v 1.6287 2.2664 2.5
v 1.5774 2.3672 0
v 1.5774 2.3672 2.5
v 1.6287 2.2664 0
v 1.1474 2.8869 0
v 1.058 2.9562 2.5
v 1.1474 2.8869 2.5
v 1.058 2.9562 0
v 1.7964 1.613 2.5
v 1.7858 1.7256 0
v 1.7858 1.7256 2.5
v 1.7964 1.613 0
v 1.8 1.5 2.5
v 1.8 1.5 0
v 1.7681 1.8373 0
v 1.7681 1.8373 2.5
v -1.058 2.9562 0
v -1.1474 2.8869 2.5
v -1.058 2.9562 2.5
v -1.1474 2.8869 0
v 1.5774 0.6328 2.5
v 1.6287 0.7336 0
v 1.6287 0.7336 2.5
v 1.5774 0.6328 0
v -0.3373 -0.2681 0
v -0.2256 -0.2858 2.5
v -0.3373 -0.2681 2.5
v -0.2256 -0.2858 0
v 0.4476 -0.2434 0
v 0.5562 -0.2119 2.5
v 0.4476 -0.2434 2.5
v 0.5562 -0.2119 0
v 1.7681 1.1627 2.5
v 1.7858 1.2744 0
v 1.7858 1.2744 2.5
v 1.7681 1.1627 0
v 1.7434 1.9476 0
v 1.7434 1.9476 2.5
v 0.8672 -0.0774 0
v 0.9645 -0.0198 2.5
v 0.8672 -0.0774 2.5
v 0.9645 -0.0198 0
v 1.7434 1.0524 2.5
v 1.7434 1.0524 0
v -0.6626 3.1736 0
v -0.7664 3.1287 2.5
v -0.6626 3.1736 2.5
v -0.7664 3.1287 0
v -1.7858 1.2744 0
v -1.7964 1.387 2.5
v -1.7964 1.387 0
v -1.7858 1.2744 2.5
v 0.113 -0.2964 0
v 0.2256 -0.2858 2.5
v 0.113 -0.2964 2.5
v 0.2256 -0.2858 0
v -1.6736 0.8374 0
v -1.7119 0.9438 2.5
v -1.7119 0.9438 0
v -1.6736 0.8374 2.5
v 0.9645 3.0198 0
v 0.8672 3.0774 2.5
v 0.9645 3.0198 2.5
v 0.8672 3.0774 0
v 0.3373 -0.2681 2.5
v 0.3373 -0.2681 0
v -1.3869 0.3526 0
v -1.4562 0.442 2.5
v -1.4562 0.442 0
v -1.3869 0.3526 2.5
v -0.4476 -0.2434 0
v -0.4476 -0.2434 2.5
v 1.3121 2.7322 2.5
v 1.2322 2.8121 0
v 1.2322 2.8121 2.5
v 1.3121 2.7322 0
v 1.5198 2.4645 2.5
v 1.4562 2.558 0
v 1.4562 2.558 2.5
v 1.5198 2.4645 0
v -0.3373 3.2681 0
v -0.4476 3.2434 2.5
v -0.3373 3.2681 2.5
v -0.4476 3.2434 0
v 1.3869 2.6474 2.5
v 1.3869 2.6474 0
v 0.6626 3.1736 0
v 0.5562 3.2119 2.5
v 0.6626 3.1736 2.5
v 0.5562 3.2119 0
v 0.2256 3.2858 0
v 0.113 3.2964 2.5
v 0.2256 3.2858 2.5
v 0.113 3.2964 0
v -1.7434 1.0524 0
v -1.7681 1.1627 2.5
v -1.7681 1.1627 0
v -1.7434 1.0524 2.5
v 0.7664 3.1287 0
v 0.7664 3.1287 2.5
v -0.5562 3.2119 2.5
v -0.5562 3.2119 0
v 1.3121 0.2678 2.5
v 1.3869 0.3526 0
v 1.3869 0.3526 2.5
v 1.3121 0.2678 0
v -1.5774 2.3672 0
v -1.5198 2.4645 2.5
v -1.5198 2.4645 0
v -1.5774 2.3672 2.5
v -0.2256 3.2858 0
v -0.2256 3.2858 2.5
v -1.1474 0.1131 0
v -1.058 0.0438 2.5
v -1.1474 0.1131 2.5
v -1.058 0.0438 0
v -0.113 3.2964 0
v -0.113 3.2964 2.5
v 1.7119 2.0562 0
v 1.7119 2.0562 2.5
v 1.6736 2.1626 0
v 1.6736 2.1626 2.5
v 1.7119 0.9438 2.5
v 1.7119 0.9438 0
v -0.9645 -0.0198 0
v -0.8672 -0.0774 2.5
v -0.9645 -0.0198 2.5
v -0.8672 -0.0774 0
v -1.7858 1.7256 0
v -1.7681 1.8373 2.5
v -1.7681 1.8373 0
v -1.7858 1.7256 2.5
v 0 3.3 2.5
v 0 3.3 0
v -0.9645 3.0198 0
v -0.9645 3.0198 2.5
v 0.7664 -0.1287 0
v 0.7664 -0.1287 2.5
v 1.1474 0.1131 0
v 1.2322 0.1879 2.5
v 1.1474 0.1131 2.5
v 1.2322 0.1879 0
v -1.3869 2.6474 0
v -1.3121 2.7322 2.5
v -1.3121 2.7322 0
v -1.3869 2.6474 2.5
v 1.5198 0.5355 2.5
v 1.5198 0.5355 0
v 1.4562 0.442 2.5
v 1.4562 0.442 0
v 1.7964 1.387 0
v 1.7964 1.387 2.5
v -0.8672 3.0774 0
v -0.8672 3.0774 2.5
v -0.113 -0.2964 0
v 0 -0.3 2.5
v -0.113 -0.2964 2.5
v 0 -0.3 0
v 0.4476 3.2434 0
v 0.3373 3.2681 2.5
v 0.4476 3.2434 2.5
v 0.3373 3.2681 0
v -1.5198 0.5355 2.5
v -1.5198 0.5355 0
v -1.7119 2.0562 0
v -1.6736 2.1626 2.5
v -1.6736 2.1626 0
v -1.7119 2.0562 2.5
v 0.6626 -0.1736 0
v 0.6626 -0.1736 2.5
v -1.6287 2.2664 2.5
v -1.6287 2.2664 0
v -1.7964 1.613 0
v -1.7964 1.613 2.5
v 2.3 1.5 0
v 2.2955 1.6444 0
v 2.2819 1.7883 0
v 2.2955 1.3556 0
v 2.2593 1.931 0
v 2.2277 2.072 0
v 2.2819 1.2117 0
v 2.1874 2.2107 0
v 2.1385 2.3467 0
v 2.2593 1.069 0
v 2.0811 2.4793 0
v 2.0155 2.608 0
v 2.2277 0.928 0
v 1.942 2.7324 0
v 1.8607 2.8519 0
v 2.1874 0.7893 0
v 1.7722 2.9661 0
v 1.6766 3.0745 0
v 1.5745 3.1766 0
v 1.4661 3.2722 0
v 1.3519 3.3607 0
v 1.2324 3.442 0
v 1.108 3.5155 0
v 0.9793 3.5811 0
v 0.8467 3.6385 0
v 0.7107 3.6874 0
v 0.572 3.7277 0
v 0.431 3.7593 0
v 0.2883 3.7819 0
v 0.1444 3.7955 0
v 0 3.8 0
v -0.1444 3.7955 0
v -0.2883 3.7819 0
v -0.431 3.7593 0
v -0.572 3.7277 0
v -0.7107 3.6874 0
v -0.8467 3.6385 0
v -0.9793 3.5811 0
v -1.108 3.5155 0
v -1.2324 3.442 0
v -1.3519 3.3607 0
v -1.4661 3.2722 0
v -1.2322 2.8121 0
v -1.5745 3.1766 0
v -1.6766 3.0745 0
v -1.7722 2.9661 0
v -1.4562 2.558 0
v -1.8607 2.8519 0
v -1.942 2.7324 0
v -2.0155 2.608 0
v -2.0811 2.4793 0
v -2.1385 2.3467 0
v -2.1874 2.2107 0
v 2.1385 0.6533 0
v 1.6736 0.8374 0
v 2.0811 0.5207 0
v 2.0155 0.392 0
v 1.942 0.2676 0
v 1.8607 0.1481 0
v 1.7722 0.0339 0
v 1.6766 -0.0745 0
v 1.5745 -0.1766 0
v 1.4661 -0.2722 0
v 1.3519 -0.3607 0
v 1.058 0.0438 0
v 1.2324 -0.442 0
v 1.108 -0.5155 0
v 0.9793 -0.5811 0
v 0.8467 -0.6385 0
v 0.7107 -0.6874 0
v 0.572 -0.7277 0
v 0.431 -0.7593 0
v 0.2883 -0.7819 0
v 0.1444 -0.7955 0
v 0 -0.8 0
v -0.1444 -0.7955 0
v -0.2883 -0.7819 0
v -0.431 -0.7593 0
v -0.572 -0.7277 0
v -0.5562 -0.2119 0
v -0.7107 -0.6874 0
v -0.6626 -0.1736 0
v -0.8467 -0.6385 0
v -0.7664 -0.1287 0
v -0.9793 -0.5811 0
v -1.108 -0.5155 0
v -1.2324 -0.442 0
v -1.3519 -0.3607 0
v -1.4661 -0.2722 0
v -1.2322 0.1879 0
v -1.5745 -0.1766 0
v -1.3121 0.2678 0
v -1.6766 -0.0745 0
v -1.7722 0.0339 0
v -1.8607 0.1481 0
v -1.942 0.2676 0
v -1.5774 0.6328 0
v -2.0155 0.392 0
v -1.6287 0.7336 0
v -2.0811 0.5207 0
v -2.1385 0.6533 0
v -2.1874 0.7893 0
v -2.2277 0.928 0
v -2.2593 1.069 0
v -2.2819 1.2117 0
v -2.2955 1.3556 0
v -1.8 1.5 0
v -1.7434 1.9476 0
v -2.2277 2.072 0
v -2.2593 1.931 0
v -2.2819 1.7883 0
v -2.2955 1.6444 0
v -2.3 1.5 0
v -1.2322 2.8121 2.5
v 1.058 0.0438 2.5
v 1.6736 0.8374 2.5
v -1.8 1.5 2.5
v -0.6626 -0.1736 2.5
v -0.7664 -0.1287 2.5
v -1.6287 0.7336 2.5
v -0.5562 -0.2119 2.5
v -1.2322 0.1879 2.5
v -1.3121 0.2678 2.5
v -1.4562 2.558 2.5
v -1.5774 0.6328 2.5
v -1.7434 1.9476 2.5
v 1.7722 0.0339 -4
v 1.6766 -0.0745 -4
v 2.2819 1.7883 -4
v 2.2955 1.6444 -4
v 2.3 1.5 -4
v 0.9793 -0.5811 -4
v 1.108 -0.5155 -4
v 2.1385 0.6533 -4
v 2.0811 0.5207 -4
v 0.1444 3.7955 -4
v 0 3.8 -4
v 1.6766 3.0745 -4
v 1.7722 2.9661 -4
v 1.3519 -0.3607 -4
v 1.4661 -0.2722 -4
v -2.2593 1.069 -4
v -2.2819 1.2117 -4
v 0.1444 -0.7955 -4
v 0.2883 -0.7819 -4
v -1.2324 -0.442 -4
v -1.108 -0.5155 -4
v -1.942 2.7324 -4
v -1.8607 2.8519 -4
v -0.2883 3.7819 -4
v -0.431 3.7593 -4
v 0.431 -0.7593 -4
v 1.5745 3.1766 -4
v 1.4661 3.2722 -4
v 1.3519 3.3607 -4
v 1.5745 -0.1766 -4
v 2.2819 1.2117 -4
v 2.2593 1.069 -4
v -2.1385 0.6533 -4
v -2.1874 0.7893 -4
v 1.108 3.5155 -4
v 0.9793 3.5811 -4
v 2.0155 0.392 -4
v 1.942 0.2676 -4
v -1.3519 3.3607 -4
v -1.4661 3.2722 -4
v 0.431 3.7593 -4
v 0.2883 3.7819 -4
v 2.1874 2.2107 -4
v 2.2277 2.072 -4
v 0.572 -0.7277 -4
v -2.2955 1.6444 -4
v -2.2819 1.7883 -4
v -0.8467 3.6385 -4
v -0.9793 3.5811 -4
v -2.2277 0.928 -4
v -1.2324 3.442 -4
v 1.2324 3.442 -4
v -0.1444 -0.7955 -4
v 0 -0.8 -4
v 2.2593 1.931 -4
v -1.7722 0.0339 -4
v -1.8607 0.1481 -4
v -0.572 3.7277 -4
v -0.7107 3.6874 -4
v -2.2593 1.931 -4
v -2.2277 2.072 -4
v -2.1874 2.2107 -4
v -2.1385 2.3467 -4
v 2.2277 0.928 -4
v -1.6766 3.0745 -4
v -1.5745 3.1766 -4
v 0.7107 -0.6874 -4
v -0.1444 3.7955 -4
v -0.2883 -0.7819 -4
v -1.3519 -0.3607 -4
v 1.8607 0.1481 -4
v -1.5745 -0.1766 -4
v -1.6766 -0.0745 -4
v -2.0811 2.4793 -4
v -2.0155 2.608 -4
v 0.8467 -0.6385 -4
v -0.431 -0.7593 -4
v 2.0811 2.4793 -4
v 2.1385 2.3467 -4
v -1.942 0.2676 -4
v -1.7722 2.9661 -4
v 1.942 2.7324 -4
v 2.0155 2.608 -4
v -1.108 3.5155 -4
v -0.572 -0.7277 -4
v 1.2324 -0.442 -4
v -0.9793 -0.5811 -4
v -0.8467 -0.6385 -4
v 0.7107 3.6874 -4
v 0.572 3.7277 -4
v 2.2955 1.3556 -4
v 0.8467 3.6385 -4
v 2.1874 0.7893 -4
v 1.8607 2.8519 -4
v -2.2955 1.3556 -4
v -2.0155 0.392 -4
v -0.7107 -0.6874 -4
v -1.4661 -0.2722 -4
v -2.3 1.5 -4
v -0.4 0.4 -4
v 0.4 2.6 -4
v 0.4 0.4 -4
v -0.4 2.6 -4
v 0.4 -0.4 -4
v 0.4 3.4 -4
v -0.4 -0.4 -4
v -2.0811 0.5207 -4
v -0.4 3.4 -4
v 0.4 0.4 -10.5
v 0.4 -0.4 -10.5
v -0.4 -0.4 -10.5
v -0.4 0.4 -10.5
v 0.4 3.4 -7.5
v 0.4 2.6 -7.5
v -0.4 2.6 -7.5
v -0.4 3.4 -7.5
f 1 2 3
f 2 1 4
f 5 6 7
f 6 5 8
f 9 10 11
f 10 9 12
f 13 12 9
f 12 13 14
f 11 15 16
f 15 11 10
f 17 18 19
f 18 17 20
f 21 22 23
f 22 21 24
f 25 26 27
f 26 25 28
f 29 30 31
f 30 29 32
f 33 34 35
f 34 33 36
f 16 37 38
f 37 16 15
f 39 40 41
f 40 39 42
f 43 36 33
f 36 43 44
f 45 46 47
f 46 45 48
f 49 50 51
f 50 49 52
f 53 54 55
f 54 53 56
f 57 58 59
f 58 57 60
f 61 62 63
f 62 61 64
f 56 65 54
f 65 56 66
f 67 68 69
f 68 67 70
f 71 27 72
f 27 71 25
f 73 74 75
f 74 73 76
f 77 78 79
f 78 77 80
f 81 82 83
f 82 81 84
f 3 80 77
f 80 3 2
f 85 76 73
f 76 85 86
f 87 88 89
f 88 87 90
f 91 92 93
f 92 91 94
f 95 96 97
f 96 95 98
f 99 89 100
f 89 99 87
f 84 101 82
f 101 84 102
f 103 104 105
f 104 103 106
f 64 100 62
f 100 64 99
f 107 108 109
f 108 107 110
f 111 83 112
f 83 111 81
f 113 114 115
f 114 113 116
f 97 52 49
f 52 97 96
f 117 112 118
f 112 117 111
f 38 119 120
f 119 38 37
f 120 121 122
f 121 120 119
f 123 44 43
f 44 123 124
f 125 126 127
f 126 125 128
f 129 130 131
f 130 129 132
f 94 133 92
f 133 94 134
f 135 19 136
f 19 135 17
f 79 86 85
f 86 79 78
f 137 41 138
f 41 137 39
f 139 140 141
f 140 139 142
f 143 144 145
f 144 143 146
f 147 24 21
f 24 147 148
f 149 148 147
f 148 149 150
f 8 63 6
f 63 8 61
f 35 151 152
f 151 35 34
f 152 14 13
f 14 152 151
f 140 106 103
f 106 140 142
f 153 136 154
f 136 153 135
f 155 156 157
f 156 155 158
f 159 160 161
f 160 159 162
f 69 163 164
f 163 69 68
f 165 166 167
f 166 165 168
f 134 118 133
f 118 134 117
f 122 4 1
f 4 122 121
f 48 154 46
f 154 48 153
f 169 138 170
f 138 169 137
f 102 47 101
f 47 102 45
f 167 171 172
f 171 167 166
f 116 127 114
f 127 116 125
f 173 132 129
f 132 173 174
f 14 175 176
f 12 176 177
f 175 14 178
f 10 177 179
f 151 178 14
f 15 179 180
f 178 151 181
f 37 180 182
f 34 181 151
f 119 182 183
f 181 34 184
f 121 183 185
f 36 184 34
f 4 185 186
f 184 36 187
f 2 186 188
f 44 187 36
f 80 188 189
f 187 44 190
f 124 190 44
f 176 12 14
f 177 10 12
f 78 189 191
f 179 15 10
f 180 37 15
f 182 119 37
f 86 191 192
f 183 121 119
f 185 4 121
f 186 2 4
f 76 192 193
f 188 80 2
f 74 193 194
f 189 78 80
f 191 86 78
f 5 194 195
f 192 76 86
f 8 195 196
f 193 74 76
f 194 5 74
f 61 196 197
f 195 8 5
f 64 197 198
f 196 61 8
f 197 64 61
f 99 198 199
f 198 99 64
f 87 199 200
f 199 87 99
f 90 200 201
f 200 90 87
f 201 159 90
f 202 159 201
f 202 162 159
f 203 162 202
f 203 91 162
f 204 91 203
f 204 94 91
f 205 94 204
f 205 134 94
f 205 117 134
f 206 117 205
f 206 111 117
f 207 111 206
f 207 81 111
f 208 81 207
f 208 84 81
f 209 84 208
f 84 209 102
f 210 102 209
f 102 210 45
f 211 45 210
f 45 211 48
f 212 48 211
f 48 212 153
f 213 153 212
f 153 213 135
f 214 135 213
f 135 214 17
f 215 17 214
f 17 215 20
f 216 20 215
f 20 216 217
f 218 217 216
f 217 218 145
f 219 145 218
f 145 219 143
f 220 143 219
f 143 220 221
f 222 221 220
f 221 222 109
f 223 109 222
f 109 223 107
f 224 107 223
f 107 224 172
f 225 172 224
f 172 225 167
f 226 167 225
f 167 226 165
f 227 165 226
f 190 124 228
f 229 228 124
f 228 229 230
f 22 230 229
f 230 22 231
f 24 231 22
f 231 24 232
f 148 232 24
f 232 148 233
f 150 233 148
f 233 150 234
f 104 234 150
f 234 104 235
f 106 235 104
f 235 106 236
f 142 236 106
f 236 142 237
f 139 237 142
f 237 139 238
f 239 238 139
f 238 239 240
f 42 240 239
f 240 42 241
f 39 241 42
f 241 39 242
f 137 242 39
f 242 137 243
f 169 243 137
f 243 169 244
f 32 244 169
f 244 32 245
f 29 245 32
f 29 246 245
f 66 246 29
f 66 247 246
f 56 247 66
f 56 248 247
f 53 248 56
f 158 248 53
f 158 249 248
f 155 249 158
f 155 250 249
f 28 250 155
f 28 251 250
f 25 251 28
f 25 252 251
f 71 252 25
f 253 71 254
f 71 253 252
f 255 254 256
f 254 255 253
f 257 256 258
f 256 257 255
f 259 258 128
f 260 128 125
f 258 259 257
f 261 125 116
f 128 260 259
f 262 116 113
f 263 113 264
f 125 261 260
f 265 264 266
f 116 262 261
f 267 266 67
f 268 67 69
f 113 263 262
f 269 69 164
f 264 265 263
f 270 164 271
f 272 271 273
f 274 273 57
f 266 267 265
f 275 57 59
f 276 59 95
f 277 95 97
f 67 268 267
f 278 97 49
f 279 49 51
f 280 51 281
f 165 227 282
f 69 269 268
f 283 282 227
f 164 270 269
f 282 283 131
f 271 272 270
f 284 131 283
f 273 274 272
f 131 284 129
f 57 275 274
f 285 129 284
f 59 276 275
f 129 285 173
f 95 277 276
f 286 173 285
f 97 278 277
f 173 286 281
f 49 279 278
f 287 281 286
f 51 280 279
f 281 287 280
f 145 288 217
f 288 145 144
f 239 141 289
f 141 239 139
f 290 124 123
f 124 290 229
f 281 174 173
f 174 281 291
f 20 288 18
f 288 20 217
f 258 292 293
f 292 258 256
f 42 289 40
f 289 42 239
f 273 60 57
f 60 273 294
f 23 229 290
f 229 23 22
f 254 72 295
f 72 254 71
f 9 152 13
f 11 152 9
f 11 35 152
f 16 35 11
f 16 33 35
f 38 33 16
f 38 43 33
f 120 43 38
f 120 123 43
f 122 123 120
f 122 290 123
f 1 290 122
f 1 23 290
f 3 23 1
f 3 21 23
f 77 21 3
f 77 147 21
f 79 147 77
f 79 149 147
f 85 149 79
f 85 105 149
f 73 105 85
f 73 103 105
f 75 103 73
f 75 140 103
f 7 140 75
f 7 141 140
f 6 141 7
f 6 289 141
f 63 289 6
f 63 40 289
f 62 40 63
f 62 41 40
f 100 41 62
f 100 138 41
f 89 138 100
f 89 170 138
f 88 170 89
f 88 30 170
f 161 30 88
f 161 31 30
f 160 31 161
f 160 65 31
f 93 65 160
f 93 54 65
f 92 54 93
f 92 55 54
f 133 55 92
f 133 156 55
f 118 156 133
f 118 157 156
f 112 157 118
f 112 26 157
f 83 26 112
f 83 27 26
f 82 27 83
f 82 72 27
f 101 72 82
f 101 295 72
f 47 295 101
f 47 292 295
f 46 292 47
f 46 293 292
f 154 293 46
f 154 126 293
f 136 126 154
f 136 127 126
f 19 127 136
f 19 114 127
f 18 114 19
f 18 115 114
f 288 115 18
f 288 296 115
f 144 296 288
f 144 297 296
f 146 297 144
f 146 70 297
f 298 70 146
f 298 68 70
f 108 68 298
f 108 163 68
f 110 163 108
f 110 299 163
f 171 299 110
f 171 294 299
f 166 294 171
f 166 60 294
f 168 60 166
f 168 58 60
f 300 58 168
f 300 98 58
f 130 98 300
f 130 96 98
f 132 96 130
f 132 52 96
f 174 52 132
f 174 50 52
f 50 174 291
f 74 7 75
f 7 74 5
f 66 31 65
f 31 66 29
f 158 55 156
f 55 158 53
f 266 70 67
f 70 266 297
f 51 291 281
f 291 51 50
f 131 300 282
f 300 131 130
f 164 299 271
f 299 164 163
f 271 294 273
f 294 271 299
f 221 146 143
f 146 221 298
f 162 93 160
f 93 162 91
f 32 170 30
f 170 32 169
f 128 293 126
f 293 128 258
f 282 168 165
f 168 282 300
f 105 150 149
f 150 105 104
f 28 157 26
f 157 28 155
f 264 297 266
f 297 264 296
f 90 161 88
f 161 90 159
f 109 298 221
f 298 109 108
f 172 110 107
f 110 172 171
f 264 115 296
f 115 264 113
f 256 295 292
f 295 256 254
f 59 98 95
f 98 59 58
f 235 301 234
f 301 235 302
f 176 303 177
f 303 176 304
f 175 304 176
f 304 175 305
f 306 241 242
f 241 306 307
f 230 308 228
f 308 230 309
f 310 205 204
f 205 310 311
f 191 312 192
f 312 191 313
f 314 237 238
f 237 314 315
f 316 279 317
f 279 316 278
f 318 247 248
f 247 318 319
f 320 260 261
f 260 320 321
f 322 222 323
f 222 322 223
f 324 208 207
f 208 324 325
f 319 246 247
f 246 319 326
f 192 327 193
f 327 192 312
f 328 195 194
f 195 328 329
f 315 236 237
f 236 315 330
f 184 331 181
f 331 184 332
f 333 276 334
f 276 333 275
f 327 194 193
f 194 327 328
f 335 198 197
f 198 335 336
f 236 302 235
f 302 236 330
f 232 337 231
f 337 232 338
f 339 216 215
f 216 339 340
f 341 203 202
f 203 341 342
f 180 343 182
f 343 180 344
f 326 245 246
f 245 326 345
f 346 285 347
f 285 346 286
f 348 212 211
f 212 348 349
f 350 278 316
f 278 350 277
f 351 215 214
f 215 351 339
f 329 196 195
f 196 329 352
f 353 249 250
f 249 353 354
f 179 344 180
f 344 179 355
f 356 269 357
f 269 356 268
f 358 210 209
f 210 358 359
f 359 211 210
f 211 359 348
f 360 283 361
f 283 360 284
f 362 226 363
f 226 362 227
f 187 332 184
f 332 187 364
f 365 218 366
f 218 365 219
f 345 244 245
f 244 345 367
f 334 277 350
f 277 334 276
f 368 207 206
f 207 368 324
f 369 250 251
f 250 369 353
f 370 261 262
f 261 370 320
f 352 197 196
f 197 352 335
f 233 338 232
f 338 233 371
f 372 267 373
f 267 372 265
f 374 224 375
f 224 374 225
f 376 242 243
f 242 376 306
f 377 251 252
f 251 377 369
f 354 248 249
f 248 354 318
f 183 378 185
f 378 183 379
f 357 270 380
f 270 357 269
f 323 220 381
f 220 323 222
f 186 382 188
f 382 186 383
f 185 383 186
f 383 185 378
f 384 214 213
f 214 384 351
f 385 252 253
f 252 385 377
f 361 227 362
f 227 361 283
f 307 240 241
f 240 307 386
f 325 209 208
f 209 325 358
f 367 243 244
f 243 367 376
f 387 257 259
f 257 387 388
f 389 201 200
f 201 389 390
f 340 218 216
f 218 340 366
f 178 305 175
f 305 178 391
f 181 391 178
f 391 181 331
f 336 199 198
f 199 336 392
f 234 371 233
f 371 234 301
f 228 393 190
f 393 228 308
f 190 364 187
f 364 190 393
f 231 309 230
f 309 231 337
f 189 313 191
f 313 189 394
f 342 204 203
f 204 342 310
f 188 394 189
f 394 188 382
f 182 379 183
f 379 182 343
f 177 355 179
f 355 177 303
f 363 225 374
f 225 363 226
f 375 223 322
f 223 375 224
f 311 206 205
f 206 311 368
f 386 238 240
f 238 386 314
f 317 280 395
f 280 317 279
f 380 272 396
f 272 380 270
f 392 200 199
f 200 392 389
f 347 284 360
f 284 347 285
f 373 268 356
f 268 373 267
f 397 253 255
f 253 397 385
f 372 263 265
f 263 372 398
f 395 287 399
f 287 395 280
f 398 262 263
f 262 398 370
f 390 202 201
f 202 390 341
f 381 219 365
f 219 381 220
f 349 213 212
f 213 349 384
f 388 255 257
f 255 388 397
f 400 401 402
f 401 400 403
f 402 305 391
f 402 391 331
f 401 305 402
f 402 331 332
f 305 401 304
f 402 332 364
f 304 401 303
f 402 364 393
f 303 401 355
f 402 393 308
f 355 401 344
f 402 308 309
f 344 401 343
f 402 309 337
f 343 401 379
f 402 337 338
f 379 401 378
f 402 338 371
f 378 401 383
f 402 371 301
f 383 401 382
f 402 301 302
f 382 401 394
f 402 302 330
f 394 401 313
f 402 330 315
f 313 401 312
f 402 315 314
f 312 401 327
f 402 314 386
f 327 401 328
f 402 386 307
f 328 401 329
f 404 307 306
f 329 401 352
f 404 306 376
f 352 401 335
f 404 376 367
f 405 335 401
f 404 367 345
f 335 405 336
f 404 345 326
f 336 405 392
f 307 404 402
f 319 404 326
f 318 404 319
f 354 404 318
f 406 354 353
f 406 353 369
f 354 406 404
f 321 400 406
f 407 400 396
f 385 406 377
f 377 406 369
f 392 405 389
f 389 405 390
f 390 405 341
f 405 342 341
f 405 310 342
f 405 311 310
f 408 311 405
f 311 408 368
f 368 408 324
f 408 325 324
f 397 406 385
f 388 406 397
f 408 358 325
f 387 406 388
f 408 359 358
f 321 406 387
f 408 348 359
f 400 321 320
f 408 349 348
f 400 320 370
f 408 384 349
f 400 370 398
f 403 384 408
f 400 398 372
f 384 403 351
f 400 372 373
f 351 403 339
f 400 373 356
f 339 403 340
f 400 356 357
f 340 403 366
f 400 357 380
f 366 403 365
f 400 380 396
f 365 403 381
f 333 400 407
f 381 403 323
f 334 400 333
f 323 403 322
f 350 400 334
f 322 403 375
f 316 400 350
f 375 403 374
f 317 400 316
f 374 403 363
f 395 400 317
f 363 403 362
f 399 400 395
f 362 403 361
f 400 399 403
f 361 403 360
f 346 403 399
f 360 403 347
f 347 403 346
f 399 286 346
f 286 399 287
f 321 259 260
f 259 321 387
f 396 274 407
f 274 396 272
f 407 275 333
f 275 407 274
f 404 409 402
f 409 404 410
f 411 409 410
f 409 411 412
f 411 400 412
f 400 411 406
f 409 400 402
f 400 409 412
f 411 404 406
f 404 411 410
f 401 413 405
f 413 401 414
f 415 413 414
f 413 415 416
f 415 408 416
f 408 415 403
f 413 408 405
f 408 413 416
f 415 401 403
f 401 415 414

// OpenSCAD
tolerance = 0.3;
$fn = $preview ? 20 : 100;

module led(d = 3) {
    translate([0, 1.5, 0]){
        cylinder(d = d + (2 * tolerance), h = 2.5);
        
        translate([0, 0, -4])
        cylinder(d = d + 1 + (2 * tolerance), h = 4);
        
        translate([0, -1.5, -7])
        cube([0.8, 0.8, 7], center=true);
        
        translate([0, 1.5, -5])
        cube([0.8, 0.8, 5], center=true);   
    }
}

led();
